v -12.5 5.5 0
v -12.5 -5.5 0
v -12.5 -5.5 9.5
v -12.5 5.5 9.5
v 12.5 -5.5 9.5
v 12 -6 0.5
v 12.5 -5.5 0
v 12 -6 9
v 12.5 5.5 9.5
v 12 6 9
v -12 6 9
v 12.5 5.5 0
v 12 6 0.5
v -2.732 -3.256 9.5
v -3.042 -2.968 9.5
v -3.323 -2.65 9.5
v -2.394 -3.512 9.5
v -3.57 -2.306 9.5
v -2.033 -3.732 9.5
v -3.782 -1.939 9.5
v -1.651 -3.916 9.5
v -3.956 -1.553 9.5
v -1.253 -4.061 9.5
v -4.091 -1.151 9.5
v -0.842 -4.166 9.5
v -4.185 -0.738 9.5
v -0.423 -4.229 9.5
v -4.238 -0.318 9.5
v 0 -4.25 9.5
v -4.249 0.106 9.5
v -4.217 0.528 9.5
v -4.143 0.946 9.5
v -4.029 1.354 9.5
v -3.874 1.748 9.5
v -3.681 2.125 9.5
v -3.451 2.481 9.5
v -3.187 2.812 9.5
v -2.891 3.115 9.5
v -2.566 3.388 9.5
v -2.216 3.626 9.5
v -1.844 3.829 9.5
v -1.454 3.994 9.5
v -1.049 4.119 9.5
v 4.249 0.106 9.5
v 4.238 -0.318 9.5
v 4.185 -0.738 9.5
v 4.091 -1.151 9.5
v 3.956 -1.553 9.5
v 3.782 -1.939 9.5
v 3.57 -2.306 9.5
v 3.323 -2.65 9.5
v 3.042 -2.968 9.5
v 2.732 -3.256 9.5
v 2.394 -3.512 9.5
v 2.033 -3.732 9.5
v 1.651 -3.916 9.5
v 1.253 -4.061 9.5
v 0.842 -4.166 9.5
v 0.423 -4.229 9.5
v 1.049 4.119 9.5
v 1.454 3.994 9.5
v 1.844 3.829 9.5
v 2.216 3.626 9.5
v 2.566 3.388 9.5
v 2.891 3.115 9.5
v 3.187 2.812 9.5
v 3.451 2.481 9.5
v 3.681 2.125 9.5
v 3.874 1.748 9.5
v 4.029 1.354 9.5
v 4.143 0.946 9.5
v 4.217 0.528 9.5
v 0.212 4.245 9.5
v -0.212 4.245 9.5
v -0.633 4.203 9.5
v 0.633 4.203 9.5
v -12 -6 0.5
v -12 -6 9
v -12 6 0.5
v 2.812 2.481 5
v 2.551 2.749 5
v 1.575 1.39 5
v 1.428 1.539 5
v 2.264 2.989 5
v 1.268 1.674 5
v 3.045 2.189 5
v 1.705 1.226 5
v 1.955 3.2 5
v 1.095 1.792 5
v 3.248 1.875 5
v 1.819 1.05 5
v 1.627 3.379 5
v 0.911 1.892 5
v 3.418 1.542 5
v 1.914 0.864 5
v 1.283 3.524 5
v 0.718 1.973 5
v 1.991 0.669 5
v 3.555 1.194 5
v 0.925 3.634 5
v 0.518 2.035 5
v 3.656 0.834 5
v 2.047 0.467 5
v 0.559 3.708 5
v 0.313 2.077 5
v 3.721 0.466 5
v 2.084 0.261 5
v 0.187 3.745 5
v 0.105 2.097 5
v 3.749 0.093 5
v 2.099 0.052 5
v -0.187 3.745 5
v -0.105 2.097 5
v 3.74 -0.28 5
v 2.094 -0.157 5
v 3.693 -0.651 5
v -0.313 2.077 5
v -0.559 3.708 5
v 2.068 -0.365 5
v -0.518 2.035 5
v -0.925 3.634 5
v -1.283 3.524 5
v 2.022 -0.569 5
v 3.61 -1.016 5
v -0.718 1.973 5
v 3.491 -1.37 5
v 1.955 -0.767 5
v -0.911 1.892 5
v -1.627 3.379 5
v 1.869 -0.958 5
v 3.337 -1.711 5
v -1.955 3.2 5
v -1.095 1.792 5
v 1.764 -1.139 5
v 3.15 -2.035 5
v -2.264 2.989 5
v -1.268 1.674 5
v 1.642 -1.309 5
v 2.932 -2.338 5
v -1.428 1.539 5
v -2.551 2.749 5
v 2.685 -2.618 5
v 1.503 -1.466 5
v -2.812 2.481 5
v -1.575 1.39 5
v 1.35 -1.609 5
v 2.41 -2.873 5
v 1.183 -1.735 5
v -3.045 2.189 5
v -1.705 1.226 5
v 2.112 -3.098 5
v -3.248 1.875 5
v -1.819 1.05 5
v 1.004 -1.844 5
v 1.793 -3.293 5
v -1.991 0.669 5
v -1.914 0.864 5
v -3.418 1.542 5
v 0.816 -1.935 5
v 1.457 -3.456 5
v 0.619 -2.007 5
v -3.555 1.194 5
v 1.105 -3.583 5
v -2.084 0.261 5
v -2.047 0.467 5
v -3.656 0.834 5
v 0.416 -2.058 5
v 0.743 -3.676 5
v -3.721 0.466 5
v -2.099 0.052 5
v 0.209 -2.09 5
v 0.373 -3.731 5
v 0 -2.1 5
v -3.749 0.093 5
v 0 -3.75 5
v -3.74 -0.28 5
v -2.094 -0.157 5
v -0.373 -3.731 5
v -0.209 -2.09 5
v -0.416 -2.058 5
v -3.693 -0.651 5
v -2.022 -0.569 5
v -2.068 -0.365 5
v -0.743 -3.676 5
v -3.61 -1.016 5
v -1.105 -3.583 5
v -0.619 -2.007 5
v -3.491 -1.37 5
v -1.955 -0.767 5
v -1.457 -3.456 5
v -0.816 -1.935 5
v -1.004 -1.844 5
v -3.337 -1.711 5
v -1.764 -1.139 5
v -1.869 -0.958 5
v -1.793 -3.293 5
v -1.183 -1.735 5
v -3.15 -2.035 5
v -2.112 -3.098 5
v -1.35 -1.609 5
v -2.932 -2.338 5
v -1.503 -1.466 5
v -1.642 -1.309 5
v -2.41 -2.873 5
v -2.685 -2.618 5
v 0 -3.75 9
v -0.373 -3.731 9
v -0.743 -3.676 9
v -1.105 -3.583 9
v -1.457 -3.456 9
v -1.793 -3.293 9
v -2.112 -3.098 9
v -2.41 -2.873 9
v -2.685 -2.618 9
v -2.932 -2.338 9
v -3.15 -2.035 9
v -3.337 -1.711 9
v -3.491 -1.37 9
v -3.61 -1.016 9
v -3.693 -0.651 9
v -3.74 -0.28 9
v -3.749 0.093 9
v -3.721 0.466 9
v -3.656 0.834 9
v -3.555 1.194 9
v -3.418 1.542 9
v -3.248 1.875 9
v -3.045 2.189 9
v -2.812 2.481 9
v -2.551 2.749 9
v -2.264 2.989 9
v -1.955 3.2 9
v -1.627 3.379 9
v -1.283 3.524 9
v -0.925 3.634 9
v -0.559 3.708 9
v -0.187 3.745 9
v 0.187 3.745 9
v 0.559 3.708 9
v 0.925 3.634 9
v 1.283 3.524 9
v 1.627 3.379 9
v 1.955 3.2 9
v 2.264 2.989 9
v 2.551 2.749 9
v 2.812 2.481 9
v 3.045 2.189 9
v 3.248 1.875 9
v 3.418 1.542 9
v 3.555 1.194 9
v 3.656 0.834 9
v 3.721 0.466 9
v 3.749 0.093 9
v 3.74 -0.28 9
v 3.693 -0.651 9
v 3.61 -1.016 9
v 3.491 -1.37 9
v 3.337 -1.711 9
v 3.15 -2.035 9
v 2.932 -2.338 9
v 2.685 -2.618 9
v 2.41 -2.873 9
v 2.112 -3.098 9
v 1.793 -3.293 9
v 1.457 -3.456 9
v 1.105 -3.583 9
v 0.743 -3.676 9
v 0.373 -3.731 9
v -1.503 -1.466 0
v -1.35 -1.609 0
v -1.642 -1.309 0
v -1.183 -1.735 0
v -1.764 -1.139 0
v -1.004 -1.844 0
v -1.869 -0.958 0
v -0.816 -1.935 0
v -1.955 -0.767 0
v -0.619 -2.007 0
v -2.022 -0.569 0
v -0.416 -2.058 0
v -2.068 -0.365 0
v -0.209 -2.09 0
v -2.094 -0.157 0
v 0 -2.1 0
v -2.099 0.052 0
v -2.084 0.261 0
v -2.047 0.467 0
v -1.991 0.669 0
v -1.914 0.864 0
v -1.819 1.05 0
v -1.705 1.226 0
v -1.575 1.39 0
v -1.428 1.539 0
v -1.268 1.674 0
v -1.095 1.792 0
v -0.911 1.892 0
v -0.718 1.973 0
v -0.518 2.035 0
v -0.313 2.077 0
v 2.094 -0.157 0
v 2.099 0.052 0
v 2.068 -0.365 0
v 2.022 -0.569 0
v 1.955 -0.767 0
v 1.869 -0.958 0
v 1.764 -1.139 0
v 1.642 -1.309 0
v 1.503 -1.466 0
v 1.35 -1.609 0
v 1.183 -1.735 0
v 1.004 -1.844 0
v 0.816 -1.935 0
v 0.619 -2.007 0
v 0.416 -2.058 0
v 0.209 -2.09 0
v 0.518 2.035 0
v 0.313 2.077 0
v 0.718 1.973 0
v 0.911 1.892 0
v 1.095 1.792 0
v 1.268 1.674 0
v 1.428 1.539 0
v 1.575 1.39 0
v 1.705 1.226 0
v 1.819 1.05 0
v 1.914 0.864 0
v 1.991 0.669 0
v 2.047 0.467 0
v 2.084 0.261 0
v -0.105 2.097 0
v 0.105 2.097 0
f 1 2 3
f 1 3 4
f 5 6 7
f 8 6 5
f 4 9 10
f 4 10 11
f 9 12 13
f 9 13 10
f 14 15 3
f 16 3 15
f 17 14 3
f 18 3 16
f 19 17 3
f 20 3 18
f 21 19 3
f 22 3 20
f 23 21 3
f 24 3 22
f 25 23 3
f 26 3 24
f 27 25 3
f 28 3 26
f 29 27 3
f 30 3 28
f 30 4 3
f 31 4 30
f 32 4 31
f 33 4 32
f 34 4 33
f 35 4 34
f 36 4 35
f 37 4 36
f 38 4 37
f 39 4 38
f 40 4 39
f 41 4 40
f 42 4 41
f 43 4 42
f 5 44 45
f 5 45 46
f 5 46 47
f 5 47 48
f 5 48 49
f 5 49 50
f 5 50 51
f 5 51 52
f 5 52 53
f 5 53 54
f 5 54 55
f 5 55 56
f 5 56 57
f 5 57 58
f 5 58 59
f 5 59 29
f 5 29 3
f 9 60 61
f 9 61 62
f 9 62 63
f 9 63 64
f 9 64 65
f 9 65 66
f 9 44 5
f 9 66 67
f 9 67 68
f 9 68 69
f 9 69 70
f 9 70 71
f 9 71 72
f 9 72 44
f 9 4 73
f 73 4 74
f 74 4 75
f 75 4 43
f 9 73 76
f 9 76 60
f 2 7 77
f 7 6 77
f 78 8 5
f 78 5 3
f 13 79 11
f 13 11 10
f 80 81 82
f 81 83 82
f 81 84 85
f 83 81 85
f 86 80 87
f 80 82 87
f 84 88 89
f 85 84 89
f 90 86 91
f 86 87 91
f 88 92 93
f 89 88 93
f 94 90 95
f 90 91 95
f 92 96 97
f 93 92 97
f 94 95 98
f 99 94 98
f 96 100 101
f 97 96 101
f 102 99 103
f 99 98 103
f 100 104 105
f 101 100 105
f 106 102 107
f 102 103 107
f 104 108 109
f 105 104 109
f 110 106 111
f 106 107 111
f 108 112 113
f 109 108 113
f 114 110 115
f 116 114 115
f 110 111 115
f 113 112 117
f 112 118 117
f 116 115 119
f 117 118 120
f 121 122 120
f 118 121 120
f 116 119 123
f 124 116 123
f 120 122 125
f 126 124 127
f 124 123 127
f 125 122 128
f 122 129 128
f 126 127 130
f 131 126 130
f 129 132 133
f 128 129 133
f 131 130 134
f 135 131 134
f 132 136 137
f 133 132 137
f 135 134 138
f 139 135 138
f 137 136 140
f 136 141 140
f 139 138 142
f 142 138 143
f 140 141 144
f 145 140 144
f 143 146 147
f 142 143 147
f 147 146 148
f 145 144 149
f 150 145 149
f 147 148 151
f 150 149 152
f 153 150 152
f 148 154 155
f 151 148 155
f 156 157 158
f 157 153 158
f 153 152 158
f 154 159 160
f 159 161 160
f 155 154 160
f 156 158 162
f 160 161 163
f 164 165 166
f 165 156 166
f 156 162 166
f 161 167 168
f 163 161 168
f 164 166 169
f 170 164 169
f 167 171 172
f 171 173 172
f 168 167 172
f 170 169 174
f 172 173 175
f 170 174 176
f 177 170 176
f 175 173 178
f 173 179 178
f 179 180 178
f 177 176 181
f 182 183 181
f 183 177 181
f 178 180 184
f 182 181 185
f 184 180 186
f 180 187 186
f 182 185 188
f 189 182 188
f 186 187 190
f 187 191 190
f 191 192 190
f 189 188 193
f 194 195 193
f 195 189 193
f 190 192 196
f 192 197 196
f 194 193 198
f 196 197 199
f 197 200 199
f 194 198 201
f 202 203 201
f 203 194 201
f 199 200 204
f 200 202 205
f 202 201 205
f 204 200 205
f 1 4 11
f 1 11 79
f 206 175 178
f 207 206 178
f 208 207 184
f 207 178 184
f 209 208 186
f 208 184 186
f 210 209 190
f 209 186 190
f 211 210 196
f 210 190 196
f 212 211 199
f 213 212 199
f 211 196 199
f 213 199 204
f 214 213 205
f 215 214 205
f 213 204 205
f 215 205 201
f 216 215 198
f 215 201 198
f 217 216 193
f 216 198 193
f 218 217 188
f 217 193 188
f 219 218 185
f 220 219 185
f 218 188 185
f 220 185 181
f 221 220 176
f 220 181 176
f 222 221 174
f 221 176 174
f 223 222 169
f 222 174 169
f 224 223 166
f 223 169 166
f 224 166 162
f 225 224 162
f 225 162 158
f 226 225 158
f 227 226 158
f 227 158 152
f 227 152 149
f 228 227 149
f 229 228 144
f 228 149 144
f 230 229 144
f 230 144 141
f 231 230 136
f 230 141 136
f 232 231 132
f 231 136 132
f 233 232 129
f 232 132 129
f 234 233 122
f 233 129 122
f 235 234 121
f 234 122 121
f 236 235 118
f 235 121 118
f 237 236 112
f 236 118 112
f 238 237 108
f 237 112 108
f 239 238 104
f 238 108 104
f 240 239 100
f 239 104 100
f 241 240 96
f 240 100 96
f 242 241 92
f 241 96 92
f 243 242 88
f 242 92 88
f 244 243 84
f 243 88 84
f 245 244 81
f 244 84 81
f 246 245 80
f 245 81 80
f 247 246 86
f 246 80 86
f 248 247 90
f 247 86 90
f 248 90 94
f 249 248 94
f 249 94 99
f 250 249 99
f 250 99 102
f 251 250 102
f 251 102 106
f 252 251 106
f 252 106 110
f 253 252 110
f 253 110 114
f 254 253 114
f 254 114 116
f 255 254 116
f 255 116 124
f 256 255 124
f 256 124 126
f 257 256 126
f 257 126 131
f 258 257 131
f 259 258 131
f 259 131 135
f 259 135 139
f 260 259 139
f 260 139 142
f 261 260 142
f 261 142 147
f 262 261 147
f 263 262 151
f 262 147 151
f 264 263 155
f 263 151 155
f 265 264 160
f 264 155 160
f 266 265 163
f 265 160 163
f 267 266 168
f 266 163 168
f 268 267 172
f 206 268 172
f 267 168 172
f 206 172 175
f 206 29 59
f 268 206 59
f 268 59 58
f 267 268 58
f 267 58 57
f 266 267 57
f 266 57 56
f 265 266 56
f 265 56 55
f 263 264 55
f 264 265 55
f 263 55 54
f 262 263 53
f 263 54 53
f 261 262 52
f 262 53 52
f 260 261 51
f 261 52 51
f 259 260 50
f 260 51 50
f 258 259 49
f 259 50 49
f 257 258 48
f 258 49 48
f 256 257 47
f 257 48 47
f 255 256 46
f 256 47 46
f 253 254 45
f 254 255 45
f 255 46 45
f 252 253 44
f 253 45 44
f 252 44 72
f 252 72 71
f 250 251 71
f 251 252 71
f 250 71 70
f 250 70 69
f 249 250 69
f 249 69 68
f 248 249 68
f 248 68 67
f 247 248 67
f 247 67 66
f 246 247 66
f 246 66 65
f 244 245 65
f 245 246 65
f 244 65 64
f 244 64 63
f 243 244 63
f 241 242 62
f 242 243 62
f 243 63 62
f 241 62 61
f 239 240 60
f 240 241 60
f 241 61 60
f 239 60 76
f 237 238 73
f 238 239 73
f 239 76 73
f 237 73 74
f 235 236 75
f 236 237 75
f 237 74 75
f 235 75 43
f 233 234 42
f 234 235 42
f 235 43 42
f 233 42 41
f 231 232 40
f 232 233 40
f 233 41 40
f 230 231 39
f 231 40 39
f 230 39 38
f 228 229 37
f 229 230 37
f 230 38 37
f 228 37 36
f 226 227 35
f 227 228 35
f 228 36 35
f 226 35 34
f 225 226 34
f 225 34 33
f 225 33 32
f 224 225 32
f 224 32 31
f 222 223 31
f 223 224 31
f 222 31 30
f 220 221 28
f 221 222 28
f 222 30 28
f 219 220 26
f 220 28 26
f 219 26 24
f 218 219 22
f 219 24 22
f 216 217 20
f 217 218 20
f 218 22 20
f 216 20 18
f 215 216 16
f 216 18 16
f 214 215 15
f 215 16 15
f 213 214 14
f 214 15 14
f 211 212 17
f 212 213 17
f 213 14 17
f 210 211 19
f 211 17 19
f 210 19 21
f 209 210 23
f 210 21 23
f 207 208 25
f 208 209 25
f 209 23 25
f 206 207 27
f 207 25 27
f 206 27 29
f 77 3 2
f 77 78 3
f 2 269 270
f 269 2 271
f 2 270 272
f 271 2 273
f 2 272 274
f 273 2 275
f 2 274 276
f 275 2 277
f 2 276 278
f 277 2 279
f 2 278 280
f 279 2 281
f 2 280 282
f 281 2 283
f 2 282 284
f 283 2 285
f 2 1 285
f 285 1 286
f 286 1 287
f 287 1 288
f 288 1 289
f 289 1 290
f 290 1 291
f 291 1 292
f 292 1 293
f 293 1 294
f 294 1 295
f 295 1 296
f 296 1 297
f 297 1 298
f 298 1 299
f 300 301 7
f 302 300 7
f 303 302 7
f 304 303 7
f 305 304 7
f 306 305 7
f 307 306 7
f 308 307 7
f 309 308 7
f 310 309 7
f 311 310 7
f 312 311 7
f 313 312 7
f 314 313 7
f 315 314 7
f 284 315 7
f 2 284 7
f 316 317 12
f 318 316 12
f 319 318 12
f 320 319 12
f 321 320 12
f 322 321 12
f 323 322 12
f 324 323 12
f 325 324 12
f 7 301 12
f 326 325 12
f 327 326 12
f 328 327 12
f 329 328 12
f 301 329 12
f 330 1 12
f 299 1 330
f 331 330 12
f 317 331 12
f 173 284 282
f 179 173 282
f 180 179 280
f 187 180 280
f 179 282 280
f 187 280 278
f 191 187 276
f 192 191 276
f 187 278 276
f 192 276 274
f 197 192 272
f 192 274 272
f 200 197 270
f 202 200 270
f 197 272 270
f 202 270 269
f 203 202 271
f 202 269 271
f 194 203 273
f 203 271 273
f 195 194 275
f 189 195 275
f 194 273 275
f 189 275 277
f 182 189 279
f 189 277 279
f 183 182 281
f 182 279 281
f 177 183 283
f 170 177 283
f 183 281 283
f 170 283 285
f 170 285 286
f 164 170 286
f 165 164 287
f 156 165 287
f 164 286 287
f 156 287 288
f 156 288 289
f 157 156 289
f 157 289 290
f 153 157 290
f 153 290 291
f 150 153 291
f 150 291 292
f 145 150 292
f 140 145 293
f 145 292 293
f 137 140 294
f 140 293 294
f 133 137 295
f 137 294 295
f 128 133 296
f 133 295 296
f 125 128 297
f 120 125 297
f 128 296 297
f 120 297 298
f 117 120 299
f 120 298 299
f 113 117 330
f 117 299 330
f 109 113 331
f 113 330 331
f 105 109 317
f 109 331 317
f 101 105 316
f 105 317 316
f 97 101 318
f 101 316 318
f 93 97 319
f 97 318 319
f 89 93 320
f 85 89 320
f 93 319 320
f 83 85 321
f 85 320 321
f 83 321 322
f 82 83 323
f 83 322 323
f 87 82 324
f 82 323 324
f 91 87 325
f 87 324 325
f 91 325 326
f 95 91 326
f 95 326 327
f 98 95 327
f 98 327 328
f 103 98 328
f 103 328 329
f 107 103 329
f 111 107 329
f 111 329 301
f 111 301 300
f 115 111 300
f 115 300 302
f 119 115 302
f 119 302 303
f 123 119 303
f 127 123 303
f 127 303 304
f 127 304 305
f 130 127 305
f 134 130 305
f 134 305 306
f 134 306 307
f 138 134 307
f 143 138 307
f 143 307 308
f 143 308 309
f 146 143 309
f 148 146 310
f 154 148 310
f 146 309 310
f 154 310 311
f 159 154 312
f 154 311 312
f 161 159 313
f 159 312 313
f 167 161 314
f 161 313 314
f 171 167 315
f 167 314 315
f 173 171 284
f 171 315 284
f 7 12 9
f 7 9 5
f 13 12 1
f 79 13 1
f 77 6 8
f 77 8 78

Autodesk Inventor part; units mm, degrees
ref_plane "YZ Plane" through (0, 0, 0) normal (1, 0, 0) x (0, 1, 0)
ref_plane "XZ Plane" through (0, 0, 0) normal (0, 1, 0) x (-1, 0, 0)
ref_plane "XY Plane" through (0, 0, 0) normal (0, 0, 1) x (1, 0, 0)
sketch "Sketch5" plane through (0, 0, 0) normal (0, 0, 1) x (1, 0, 0)
  line L0 (-12.5, 6) -> (12.5, 6)
  line L1 (12.5, 6) -> (12.5, -6)
  line L2 (12.5, -6) -> (-12.5, -6)
  line L3 (-12.5, -6) -> (-12.5, 6)
  point P0 (0, 0)
  point P1 (0, 6)
  point P2 (12.5, 0)
  dimension "d8" = 25
  dimension "d9" = 12
extrude "Extrusion5" add sketch "Sketch5" along normal blind 9.5
sketch "Sketch6" plane through (0, 0, 9.5) normal (0, 0, 1) x (1, 0, 0)
  circle A0 centre (0, 0) radius 2
  dimension "d12" = 4
hole "Hole1" at (0, 0, 9.5) direction (0, 0, -1) diameter 4.2 end through all counterbore diameter 7.5 counterbore depth 4.5 clearance for "Socket Head Cap Screw DIN EN ISO 4762" size "M4" standard "DIN"
chamfer "Chamfer2" distance 0.5 angle 45 4 edges at (0, -6, 9.5) (0, 6, 9.5) (0, -6, 0) (0, 6, 0)
chamfer "Chamfer3" distance 0.5 angle 45 4 edges at (12.5, 6, 4.75) (-12.5, 6, 4.75) (-12.5, -6, 4.75) (12.5, -6, 4.75)
chamfer "Chamfer4" distance 0.5 angle 45 1 edges at (0, 3.75, 9.5)
properties part number "BC-10025" material "Aço Inox AISI 304"
